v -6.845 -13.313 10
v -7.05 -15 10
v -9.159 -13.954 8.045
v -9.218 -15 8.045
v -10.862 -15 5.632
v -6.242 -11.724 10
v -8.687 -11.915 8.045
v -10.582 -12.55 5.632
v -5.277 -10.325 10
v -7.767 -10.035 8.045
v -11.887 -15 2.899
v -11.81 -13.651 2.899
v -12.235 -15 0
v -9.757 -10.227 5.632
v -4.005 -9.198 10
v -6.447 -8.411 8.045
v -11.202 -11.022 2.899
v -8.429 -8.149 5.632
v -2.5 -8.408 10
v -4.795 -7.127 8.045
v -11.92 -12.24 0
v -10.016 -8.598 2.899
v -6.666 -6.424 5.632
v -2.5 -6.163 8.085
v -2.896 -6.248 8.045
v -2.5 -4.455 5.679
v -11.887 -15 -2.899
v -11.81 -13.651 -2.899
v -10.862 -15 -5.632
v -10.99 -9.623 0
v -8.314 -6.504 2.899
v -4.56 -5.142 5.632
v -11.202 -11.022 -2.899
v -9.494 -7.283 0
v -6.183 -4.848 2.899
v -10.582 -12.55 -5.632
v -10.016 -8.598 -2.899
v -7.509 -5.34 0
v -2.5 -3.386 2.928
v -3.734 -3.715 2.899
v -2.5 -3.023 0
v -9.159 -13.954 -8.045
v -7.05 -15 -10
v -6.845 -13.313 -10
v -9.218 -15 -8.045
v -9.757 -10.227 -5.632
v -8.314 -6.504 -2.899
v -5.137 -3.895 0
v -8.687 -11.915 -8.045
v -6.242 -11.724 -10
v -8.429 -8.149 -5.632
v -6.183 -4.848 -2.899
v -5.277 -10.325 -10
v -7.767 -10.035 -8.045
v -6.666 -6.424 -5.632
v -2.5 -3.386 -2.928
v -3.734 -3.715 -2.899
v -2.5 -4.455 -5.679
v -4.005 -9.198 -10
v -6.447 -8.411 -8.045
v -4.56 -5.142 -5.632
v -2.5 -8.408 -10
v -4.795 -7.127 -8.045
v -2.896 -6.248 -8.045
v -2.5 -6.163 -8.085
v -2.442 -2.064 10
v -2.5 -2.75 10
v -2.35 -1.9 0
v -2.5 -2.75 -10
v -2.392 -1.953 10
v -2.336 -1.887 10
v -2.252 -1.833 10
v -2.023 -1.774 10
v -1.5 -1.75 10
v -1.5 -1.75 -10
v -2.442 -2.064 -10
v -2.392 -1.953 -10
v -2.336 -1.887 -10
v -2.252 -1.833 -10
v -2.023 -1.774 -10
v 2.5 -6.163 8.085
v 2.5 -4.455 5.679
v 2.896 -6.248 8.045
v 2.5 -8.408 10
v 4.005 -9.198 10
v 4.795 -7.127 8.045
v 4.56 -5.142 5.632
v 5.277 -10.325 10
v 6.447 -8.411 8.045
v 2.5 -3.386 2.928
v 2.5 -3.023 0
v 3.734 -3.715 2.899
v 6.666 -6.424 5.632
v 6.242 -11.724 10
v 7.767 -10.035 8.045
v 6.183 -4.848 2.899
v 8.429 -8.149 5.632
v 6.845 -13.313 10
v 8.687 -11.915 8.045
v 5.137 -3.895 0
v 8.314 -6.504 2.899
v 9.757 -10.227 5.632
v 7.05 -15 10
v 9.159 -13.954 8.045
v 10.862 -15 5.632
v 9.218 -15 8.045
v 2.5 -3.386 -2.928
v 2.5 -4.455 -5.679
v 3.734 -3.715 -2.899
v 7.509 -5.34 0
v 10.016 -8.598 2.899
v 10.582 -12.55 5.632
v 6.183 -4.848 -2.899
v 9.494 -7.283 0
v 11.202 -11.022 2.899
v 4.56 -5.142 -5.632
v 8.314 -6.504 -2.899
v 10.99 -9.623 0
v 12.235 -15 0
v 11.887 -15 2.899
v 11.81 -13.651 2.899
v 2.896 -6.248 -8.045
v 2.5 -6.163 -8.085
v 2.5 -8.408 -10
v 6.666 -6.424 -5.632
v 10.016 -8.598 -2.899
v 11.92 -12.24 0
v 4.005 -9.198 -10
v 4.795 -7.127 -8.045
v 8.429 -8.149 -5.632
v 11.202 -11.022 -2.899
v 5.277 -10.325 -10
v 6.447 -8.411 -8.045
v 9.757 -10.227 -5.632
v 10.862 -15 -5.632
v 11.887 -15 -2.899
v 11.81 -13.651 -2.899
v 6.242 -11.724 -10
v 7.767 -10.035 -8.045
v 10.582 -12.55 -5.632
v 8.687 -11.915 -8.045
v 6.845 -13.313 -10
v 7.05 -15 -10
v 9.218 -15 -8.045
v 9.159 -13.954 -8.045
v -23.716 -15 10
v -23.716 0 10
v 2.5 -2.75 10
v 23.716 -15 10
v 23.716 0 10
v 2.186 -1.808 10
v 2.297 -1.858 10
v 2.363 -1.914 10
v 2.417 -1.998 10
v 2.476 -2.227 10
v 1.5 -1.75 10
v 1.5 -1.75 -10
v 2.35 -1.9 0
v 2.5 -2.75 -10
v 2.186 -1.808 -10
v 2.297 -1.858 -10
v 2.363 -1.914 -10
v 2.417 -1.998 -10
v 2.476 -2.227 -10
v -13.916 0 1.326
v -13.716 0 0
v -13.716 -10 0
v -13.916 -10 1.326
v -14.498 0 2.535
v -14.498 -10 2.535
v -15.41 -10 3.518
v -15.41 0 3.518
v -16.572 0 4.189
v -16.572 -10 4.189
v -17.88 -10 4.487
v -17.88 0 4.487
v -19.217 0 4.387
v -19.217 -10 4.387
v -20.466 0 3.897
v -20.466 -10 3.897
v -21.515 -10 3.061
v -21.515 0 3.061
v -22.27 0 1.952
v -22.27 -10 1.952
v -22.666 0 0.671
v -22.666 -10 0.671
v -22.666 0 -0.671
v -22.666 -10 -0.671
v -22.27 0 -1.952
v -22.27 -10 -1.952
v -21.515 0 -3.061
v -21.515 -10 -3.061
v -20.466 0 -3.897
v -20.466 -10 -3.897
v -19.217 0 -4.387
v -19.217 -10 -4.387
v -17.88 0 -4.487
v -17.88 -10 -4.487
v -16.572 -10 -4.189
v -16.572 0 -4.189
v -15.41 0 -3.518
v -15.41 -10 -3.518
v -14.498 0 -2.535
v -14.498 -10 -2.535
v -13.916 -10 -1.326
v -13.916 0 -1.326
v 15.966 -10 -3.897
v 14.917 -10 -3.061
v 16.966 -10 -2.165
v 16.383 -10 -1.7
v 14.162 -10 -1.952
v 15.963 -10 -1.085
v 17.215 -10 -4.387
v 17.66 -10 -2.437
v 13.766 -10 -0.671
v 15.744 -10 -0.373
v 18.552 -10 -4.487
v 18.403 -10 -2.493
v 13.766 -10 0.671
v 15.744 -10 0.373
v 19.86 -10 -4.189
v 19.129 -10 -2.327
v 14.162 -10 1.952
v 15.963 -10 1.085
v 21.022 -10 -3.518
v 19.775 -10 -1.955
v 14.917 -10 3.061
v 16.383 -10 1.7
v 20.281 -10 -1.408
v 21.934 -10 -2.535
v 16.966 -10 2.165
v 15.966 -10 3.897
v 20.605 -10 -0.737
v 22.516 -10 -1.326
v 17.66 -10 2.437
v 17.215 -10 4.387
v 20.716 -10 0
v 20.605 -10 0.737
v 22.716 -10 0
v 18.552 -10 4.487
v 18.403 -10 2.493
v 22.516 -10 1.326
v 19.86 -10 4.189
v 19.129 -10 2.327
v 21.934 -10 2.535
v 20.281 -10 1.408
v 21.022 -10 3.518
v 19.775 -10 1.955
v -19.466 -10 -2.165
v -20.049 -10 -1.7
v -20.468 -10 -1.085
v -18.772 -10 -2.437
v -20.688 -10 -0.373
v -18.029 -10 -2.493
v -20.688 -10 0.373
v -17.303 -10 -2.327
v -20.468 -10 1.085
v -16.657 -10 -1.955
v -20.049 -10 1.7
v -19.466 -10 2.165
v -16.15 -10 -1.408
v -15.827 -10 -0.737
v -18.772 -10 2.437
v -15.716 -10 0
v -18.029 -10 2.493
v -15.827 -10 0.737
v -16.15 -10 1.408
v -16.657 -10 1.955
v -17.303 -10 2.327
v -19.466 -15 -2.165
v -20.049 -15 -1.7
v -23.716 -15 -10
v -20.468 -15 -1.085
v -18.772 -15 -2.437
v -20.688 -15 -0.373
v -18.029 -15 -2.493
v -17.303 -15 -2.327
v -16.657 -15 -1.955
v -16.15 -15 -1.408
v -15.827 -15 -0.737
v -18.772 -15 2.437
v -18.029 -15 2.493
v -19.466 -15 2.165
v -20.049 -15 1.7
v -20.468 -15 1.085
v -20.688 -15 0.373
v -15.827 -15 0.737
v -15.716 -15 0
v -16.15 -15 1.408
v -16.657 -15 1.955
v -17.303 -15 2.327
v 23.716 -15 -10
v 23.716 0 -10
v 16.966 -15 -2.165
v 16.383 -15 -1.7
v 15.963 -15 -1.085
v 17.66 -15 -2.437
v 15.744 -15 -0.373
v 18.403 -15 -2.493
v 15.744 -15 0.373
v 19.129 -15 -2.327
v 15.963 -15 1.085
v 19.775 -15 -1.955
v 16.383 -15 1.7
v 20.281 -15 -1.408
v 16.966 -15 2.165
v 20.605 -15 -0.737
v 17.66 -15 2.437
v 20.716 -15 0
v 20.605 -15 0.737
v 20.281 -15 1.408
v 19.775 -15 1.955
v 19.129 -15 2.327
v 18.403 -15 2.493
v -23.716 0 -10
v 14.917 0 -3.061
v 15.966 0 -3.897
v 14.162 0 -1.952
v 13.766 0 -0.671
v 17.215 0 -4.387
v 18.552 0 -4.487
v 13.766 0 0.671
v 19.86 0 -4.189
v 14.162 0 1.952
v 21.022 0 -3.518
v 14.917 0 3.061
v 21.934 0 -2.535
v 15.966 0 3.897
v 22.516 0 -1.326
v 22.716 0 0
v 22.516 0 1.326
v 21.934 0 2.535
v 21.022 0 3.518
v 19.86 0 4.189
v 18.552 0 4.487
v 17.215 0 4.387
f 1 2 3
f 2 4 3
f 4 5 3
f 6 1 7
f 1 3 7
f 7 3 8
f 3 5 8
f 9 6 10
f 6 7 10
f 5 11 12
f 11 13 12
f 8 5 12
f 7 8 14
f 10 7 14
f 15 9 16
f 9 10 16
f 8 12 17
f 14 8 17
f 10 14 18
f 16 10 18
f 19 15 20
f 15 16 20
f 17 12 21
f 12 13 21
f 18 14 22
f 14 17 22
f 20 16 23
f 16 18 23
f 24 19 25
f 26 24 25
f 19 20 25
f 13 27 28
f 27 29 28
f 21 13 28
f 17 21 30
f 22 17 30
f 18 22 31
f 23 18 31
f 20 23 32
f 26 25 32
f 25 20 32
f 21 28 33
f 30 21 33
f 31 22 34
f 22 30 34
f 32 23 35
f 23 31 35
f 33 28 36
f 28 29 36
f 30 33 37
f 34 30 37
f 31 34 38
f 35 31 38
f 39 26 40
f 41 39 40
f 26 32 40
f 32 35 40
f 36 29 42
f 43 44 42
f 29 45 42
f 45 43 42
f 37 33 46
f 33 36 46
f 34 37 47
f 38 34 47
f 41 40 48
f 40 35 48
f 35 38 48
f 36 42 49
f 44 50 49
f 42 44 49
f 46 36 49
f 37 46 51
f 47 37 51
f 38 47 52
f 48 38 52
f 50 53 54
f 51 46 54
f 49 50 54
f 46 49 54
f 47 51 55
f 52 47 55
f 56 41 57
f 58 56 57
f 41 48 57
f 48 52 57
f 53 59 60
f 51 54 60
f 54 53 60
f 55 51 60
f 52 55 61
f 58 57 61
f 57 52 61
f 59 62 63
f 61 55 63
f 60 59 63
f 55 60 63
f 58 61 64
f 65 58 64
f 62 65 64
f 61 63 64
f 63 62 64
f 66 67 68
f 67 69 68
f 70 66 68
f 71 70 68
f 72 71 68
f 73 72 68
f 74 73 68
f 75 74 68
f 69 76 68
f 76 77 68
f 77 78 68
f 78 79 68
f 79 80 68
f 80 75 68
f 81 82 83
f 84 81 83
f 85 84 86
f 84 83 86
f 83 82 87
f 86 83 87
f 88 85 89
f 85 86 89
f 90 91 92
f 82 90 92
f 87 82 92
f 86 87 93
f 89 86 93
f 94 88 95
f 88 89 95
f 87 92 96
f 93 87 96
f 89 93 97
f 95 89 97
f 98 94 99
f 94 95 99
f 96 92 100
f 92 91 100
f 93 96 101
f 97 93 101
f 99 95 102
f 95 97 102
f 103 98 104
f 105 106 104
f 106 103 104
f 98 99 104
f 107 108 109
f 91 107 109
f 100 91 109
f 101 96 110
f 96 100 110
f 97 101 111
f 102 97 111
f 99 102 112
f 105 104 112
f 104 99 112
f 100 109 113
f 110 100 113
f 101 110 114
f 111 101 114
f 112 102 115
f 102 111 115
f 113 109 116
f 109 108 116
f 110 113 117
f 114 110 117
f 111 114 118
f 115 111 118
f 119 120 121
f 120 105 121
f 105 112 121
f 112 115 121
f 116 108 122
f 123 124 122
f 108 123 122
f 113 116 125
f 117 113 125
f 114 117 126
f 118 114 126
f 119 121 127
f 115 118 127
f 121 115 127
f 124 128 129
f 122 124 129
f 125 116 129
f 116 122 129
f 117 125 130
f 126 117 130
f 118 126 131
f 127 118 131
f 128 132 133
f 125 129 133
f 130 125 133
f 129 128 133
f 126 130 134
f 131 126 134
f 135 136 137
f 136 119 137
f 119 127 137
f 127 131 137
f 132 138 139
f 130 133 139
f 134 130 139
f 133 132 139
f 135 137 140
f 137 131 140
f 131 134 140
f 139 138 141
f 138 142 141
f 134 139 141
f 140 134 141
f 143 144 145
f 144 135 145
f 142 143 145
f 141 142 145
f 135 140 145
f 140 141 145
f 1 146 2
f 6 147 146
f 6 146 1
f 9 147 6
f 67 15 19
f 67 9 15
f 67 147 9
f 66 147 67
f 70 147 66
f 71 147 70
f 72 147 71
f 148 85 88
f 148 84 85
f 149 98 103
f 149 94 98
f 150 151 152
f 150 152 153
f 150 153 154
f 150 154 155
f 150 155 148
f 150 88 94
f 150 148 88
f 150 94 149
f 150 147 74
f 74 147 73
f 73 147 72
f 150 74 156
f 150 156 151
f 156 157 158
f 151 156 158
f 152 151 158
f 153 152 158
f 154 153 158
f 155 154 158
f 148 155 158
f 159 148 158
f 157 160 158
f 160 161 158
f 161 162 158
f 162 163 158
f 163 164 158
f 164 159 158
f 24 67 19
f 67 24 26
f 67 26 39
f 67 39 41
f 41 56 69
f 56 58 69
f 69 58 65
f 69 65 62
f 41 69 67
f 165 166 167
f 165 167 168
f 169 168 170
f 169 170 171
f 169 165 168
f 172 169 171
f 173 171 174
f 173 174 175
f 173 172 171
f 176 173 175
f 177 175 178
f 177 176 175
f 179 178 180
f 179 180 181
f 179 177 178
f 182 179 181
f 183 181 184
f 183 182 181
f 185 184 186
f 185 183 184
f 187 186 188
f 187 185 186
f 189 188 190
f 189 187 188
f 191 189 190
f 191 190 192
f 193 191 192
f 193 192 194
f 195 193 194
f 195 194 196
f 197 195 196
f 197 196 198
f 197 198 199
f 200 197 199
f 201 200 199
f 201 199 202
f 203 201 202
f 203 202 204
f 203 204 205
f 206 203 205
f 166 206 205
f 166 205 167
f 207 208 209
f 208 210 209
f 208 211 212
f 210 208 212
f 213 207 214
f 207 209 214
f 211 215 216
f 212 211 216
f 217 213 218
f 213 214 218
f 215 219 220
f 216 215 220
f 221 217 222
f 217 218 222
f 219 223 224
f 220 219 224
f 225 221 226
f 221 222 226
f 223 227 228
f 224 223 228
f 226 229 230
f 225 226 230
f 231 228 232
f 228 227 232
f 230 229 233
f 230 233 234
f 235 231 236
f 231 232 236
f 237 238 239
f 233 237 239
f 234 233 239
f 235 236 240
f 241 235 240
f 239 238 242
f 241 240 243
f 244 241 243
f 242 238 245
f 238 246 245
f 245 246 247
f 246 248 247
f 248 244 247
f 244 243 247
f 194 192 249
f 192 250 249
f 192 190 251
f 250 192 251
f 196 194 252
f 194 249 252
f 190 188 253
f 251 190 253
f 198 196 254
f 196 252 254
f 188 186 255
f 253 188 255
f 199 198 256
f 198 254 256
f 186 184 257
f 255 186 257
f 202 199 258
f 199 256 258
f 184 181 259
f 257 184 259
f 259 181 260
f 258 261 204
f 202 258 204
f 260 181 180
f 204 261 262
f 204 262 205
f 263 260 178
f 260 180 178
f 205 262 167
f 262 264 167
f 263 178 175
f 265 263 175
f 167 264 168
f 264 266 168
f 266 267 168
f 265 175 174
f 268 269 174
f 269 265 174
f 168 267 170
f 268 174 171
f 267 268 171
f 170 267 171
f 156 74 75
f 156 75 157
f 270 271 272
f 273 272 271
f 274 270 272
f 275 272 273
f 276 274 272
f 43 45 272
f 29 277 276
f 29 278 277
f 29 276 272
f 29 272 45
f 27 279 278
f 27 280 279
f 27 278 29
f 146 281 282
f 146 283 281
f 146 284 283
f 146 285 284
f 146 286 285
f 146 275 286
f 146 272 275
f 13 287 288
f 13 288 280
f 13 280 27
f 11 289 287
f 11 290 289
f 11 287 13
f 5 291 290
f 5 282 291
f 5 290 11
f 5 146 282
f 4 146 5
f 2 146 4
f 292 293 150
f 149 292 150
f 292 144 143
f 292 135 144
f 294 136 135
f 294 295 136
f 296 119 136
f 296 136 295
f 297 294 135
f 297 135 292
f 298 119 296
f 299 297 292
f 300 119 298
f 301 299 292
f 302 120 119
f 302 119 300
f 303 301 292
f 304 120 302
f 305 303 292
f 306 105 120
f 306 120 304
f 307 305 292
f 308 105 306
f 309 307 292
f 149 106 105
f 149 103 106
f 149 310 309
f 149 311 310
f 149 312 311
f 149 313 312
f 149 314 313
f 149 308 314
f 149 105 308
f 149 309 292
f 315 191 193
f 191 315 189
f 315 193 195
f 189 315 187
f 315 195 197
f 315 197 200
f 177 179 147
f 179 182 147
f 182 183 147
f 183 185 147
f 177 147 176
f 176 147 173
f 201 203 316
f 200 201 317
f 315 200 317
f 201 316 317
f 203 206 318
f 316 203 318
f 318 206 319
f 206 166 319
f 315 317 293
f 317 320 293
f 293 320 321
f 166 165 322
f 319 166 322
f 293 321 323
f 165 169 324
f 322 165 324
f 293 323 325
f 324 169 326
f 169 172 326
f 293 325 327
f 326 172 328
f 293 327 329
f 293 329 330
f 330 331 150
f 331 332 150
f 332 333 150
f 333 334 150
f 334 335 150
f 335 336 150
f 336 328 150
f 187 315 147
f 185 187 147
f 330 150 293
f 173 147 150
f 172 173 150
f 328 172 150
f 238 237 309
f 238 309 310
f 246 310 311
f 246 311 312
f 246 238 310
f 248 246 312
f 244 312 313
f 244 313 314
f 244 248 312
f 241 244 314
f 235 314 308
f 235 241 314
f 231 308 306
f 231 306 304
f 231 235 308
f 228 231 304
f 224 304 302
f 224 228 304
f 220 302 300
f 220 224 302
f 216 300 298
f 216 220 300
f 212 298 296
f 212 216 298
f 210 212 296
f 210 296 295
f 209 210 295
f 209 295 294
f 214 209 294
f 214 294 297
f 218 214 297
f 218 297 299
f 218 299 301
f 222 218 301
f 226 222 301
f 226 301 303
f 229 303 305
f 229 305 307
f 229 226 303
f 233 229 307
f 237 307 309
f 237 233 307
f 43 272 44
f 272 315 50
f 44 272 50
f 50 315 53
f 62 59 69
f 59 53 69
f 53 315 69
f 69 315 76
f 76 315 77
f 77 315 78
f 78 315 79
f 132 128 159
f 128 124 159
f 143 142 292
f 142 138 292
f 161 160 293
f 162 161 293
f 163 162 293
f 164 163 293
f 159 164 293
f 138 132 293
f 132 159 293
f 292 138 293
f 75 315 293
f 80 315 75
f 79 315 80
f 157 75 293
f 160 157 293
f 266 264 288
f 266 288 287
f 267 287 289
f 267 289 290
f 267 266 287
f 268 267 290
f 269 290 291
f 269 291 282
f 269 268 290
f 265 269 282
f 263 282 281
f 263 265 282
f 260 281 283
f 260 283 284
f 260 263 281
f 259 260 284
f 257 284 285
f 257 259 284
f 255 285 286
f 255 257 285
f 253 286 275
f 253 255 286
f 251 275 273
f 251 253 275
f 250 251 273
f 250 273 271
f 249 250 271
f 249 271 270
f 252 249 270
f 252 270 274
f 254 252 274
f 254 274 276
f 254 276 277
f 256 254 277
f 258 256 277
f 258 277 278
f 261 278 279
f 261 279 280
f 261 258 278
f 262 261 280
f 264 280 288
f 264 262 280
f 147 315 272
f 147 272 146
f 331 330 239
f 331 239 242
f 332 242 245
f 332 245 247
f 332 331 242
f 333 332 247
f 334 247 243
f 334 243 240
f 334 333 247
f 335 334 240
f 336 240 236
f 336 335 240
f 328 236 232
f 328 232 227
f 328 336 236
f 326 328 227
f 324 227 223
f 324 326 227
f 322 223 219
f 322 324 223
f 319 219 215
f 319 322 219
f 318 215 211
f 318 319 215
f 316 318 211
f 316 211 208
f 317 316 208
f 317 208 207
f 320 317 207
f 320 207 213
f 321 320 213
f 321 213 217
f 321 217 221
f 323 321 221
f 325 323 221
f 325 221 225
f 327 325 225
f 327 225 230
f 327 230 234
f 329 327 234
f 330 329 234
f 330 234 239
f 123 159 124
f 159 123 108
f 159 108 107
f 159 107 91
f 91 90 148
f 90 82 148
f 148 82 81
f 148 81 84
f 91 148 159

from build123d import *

# Parameters (mm, degrees)
F0_W        = 47.4317967892
F0_H        = 20
F0_R        = 4.5
F1_DEPTH    = 15
F2_R        = 7.05
F3_DEPTH    = 25
F7_DEPTH    = 13.25
F8_T1_DEPTH = 20
F9_START    = 10
F0_R_2      = 2.5
F9_DEPTH    = 5


# Not quite as in the source:
# - a fillet or chamfer that OpenCascade refuses, or shapes differently, is made with other operations: its cross-section is extruded or revolved along the edge and cut away or added


with BuildPart() as f1:
    # F0 (on Front) → F1 (new body)
    with BuildSketch(Plane.XZ):
        Rectangle(F0_W, F0_H)
        with Locations((-18.2158983946, 0)):
            Circle(F0_R, mode=Mode.SUBTRACT)
        with Locations((18.2158983946, 0)):
            Circle(F0_R, mode=Mode.SUBTRACT)
    extrude(amount=F1_DEPTH)

    # F2 (on face) → F3 (cut)
    with BuildSketch(Plane.XY.offset(10)):
        with Locations((0, -15)):
            Circle(F2_R)
    extrude(amount=-F3_DEPTH, mode=Mode.SUBTRACT)

    # F4 (on face) → F5 (revolve, cut)
    with BuildSketch(Plane.XZ.offset(15)):
        with BuildLine():
            Line((-7.05, -10), (-7.05, 10))
            ThreePointArc((-7.05, 10), (-12.2352972992, 0), (-7.05, -10))
        make_face()
    revolve(axis=Axis((0, -15, 0.0368109904), (0, 0, -1)), mode=Mode.SUBTRACT)

    # F6 (on face) → F7 (cut)
    with BuildSketch(Plane.XZ.offset(15)):
        Polygon((2.5, -10.0813228637), (2.5, 10), (0, 10), (-2.5, 10), (-2.5, -10.0813228637), (0, -10.0813228637), align=None)
    extrude(amount=-F7_DEPTH, mode=Mode.SUBTRACT)

    # F8: fillet of radius 1 on 2 edges, made by hand

    # F8_s2 → F8_t1 (join)
    with BuildSketch(Plane.XY.offset(-10)):
        with BuildLine():
            add(Edge.make_bspline(
                [(1.5, -1.75), (2.5, -1.75), (2.5, -2.75)],
                knots=[0, 0, 0, 1, 1, 1], degree=2, weights=[1, 2.3333333333, 1]))
            Line((2.5, -2.75), (2.5, -1.75))
            Line((2.5, -1.75), (1.5, -1.75))
        make_face()
        with BuildLine():
            add(Edge.make_bspline(
                [(-2.5, -2.75), (-2.5, -1.75), (-1.5, -1.75)],
                knots=[0, 0, 0, 1, 1, 1], degree=2, weights=[1, 2.3333333333, 1]))
            Line((-1.5, -1.75), (-2.5, -1.75))
            Line((-2.5, -1.75), (-2.5, -2.75))
        make_face()
    extrude(amount=F8_T1_DEPTH)

    # F0 (on Front) → F9 (join)
    with BuildSketch(Plane.XZ.offset(F9_START)):
        with Locations((-18.2158983946, 0)):
            Circle(F0_R)
        with Locations((-18.2158983946, 0)):
            Circle(F0_R_2, mode=Mode.SUBTRACT)
        with Locations((18.2158983946, 0)):
            Circle(F0_R)
        with Locations((18.2158983946, 0)):
            Circle(F0_R_2, mode=Mode.SUBTRACT)
    extrude(amount=F9_DEPTH)


solid = f1.part
